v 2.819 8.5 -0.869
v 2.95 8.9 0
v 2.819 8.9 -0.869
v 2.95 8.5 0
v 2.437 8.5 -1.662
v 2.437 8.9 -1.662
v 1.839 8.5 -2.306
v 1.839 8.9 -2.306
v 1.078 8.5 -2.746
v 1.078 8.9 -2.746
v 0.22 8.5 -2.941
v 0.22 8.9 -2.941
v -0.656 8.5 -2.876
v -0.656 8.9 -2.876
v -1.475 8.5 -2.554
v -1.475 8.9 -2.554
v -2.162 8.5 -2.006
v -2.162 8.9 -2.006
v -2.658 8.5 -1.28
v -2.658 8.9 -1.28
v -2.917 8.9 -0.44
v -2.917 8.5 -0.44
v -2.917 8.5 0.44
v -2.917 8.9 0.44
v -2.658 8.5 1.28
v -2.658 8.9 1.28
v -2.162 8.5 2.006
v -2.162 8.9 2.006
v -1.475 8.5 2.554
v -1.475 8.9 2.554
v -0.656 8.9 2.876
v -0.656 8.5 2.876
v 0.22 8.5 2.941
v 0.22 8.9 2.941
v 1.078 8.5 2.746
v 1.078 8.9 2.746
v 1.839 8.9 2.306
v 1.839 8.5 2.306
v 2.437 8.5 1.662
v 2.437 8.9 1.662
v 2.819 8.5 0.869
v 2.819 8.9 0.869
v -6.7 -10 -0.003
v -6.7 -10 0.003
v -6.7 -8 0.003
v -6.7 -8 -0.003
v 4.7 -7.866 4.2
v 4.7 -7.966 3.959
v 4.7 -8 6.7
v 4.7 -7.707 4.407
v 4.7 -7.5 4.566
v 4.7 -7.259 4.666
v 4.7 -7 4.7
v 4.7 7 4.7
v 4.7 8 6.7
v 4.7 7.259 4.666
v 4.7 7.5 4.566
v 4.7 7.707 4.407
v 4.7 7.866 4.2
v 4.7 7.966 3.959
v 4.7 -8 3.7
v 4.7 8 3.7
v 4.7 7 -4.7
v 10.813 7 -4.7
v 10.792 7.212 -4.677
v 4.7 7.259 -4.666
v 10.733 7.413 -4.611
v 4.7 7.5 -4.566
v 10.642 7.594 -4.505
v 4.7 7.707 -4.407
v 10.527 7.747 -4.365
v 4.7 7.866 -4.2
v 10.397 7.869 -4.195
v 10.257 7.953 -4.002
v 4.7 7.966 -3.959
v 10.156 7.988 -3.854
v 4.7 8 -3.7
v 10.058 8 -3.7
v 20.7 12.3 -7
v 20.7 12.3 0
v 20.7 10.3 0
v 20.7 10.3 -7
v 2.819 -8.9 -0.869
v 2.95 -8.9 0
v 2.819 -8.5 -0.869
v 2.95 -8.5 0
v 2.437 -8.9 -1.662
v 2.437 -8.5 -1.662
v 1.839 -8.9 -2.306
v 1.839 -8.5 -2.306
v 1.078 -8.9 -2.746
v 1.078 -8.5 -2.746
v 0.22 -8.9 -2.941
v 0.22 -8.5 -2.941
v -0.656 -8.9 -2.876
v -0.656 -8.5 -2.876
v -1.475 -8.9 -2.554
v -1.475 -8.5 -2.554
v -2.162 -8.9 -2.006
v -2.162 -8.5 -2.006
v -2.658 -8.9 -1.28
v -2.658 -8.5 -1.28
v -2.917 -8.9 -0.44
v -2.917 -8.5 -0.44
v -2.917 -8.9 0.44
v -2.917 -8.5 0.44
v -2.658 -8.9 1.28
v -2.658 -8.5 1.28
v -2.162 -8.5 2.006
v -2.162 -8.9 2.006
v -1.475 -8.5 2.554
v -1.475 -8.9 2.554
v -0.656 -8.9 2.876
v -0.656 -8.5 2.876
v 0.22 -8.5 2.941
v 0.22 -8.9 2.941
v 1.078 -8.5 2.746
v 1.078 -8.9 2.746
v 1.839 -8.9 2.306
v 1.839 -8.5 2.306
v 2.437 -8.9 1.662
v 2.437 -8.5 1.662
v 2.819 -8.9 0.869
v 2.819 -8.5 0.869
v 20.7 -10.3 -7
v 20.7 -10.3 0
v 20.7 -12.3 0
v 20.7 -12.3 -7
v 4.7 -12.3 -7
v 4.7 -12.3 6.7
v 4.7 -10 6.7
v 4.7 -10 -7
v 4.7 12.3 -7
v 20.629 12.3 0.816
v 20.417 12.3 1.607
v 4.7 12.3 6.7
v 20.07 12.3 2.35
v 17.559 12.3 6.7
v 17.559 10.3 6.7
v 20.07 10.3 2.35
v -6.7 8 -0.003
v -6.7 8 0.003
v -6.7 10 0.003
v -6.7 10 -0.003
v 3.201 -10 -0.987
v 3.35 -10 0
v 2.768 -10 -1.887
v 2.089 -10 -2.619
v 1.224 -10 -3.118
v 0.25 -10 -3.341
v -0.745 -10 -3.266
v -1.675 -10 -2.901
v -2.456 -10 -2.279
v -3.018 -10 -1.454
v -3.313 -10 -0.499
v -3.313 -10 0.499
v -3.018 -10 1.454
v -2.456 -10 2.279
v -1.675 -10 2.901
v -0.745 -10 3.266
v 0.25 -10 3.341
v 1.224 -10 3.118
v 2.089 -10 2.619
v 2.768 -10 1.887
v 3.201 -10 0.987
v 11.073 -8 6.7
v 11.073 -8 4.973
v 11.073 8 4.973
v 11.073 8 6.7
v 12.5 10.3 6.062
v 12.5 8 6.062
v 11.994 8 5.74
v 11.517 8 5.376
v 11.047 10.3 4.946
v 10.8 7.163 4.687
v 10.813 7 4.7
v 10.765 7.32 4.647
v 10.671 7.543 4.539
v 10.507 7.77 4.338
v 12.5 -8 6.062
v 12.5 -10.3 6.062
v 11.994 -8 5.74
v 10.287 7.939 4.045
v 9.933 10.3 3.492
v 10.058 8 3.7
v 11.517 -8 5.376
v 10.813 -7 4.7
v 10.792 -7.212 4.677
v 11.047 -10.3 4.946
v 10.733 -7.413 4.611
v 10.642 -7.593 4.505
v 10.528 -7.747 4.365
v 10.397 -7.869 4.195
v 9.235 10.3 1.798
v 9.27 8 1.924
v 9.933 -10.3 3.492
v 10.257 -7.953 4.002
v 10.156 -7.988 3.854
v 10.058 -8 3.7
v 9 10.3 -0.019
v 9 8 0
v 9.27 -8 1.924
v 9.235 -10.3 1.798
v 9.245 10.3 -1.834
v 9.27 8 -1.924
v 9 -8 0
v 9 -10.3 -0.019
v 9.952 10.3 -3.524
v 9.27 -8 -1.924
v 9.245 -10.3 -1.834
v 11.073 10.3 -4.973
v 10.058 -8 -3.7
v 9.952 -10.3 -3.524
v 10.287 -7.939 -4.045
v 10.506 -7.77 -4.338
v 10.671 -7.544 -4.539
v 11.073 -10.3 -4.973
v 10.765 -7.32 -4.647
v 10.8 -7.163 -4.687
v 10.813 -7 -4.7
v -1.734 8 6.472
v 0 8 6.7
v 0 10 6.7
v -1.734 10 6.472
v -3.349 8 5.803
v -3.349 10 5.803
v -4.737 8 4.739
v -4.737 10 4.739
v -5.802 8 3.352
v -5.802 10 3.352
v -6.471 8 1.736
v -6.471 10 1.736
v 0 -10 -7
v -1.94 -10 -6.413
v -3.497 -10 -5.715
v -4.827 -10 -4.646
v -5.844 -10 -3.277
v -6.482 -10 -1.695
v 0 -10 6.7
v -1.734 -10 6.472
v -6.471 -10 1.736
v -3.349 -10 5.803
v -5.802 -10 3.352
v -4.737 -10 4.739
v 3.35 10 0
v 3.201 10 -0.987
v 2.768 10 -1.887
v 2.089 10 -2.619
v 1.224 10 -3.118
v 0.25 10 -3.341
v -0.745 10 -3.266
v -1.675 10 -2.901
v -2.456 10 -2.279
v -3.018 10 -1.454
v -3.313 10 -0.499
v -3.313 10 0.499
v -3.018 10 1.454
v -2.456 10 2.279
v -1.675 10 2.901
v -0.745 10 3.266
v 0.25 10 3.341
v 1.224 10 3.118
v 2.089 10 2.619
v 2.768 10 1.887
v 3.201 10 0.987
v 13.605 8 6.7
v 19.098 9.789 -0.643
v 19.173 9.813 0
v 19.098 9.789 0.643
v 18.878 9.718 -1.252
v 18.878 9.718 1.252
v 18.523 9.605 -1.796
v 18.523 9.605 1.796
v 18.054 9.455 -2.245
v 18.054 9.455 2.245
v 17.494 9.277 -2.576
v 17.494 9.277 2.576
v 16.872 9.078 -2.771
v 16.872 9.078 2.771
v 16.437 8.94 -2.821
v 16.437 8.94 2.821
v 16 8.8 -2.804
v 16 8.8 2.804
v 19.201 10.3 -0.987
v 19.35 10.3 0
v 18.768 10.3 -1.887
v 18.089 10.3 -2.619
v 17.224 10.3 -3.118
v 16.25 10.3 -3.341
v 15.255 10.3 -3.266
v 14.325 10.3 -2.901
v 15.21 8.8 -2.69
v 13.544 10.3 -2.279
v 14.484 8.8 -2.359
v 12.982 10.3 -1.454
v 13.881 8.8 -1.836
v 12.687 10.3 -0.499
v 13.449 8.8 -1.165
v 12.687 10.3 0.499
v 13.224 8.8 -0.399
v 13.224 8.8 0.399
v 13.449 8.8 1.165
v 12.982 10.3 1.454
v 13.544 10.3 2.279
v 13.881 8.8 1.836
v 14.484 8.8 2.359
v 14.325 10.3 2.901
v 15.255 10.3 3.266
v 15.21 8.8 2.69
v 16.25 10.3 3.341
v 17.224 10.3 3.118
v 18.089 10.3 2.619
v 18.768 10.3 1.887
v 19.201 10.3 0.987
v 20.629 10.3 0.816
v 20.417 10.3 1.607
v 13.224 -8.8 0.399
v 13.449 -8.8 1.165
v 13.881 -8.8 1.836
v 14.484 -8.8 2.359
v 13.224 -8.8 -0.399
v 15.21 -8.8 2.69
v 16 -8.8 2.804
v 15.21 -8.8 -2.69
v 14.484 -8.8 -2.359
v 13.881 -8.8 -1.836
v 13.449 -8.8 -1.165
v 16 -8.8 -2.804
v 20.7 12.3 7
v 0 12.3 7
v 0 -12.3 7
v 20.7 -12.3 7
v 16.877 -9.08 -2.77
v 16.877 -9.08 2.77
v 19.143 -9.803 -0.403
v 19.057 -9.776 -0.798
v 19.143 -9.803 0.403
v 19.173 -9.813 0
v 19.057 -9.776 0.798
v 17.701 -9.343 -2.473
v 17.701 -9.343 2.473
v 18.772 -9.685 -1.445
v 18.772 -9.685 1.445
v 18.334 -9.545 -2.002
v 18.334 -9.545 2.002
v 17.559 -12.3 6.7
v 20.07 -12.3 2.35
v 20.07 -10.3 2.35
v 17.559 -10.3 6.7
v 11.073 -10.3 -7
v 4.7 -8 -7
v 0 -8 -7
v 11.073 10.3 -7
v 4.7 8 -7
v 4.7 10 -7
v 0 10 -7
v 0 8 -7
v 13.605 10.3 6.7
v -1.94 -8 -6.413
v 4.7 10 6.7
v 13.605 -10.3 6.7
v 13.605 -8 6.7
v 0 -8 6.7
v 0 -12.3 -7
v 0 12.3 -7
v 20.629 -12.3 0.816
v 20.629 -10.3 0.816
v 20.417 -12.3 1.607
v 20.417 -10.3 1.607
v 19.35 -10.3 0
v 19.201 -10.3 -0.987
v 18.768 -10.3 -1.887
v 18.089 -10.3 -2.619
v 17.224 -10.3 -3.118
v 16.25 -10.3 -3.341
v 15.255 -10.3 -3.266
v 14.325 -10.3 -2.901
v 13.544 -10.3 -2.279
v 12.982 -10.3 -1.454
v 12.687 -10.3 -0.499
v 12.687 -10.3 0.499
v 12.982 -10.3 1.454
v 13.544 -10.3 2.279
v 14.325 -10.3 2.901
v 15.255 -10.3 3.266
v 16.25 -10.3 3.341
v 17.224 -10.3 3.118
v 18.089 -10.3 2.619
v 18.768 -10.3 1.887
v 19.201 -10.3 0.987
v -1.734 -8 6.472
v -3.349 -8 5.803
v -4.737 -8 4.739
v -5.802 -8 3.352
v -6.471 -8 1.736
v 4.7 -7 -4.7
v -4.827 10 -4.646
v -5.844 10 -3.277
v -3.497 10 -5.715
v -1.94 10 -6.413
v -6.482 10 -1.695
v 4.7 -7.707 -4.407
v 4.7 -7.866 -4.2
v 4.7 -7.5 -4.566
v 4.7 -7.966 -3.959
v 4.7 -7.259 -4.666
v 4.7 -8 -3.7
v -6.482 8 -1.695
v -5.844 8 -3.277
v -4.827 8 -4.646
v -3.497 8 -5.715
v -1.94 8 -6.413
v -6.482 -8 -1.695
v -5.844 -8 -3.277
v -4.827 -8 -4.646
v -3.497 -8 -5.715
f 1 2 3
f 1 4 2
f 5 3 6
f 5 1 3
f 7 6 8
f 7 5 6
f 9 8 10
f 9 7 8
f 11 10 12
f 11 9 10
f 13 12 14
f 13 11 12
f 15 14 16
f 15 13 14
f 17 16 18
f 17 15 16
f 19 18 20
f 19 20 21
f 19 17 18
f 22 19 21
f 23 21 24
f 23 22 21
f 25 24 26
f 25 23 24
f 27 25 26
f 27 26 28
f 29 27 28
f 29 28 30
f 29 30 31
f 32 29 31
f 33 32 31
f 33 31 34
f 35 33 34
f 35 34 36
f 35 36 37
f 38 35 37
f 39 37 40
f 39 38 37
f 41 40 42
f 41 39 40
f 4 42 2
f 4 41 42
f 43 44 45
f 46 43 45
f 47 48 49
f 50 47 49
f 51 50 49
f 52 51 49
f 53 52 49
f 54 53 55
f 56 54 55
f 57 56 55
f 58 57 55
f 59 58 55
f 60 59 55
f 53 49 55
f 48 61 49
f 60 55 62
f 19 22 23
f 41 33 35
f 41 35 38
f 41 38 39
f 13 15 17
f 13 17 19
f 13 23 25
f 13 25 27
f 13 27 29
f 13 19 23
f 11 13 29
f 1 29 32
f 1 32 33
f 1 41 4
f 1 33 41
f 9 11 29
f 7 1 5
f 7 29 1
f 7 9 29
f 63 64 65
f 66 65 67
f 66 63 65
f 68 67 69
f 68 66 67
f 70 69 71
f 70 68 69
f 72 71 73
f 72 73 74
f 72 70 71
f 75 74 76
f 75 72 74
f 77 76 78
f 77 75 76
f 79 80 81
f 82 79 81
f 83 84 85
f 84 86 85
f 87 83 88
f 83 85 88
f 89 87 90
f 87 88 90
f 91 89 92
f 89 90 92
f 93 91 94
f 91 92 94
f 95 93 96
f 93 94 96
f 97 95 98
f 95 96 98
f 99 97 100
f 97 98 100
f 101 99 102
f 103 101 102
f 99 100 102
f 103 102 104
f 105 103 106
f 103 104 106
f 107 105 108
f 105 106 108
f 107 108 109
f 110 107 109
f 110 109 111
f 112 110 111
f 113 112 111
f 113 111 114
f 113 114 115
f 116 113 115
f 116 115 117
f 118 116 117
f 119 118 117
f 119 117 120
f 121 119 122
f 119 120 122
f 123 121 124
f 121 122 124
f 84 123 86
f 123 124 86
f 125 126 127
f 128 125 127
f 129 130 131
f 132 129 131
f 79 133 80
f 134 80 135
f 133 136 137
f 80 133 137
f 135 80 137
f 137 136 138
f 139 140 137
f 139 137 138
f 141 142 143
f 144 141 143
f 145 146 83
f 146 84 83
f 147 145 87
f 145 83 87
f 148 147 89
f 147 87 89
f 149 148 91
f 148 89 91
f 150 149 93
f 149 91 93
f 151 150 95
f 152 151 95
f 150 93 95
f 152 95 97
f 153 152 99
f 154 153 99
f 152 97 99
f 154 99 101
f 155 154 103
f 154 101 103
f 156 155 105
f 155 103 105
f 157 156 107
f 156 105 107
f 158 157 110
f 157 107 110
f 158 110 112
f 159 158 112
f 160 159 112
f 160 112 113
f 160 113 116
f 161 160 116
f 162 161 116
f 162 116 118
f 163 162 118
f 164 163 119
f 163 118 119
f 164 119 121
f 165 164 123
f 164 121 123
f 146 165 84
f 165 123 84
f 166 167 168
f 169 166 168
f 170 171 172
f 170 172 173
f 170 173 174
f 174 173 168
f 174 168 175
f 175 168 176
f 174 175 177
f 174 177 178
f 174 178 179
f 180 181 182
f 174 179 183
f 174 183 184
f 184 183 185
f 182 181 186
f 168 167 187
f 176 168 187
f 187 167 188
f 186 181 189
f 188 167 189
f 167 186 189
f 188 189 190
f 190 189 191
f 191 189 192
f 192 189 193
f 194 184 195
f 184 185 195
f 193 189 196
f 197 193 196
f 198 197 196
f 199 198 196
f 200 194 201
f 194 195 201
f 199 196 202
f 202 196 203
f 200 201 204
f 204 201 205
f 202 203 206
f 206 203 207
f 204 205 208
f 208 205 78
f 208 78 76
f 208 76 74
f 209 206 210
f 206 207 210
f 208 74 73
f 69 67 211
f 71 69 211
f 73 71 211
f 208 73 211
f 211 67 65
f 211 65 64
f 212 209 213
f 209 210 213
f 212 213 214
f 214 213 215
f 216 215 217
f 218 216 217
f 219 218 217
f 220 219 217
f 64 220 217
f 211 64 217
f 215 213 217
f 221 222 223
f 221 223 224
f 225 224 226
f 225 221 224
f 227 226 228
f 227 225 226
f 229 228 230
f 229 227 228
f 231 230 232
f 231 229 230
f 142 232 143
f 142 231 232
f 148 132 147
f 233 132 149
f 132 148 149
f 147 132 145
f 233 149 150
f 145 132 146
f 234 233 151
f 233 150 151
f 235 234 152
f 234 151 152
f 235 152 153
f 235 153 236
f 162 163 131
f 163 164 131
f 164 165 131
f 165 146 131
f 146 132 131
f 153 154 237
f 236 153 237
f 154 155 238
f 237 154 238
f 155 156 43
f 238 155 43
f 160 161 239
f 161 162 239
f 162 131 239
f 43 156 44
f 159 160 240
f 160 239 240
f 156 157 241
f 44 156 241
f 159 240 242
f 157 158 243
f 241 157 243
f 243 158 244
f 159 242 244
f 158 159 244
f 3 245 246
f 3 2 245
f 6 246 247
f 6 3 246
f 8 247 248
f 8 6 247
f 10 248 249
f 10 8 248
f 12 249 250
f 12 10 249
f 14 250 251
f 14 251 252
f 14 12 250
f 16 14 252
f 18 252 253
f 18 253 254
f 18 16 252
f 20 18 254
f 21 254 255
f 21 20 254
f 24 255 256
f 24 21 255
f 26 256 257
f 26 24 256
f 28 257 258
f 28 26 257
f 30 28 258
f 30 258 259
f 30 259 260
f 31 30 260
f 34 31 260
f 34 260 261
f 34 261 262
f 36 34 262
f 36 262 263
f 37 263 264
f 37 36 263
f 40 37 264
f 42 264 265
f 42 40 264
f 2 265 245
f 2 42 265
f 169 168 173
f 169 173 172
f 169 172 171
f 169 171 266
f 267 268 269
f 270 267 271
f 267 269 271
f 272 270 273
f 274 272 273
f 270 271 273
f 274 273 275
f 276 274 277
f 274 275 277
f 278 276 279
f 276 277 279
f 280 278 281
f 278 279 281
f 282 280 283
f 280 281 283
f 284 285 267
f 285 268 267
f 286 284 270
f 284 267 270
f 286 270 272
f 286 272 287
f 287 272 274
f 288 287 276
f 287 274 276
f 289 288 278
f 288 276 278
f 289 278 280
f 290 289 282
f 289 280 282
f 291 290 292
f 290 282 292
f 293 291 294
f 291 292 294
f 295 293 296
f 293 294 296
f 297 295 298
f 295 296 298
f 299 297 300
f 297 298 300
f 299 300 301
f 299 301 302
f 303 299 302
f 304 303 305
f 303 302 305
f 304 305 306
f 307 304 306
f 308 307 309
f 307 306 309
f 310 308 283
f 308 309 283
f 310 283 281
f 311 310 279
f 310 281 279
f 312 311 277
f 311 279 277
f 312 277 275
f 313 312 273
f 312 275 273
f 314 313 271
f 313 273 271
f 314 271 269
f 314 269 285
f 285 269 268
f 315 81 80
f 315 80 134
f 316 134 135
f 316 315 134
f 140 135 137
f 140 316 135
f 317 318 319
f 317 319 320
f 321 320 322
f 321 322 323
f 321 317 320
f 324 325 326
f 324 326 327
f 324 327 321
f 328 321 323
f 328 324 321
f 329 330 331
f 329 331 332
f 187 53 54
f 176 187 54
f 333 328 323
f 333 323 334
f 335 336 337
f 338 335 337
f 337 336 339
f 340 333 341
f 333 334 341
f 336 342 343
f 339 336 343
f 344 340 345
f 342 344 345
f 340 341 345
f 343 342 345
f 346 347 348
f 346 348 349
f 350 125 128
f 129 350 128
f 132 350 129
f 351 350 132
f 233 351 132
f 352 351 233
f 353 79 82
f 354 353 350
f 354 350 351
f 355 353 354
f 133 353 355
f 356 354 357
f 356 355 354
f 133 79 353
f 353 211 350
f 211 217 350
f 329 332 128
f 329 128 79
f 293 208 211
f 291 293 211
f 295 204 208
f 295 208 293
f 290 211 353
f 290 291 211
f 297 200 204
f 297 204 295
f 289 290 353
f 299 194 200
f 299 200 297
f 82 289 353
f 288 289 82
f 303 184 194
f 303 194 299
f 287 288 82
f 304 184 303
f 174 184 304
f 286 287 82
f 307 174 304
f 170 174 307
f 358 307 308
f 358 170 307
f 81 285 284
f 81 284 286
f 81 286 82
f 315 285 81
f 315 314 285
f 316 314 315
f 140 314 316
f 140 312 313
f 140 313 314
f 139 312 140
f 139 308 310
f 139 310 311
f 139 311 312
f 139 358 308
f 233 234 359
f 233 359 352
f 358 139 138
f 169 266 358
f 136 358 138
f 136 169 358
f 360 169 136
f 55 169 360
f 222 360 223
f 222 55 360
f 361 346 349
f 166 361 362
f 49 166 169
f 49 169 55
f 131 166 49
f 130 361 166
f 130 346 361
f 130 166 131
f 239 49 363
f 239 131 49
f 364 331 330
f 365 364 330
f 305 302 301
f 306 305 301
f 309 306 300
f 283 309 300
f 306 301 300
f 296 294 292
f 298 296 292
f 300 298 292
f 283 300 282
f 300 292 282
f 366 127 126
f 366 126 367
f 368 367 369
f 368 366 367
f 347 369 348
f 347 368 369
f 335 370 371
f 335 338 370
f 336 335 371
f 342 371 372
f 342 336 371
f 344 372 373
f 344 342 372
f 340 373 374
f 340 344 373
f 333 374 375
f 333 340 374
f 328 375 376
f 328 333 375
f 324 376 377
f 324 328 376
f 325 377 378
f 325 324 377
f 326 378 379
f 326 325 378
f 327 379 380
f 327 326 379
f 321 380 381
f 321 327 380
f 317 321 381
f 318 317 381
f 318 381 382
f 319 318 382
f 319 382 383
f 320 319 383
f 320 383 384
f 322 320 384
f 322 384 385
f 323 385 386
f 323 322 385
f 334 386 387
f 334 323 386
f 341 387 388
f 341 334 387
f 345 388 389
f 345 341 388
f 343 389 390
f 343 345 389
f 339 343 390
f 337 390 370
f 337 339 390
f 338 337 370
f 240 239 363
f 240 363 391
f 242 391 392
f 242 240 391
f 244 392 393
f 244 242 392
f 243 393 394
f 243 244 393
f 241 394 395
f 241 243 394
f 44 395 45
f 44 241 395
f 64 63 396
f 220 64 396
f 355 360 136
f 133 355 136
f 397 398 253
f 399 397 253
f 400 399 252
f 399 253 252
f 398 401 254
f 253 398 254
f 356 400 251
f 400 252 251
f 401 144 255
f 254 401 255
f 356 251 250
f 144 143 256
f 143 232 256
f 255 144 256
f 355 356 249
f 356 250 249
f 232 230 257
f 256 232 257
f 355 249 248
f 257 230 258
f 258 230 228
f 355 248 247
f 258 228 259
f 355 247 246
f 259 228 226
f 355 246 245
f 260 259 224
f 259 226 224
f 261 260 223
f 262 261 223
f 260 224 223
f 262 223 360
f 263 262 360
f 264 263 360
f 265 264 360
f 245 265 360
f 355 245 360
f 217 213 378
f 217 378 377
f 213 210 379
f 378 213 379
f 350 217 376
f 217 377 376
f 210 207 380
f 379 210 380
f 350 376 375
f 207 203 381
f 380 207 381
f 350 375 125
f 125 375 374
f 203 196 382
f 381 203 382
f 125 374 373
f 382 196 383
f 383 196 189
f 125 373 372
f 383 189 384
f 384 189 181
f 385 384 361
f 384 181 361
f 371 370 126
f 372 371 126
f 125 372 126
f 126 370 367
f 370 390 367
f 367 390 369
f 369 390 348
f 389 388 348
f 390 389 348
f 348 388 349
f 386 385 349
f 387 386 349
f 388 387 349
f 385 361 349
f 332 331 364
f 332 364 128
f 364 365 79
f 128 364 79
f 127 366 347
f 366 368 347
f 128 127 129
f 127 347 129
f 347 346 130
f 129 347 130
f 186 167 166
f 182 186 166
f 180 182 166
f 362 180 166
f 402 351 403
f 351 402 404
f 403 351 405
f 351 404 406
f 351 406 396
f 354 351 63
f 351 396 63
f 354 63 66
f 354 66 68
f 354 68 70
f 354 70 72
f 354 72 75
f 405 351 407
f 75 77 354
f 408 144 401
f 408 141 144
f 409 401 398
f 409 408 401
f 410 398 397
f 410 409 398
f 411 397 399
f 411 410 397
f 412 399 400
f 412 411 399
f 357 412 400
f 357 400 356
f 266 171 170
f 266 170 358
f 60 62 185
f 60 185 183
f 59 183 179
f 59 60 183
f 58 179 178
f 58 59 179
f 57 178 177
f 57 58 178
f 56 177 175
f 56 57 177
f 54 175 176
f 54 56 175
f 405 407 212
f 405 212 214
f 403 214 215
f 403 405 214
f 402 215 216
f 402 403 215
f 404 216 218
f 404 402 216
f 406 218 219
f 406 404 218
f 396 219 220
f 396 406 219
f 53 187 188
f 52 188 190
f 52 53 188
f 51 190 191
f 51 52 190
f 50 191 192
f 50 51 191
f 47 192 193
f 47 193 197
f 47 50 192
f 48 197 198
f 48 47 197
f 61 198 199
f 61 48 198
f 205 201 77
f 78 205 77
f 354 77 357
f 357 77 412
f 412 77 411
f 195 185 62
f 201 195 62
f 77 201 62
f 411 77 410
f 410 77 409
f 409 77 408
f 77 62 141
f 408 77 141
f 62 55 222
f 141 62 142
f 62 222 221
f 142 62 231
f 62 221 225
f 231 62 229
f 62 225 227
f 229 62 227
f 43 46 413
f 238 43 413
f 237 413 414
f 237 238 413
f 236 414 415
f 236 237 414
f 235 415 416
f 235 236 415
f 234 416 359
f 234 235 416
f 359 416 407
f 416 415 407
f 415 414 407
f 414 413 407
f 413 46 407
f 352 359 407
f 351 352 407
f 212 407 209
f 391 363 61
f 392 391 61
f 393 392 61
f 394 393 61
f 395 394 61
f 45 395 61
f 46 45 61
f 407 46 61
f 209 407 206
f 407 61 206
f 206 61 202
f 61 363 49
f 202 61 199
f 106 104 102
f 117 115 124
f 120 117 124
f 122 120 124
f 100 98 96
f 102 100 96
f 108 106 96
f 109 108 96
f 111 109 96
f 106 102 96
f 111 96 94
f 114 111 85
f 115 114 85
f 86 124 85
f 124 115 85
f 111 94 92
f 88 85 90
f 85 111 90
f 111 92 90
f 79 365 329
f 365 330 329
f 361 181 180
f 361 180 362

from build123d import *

# Parameters (mm, degrees)
PAD_DEPTH            = 7
SKETCH002_W          = 29.4
SKETCH002_H          = 15.7
POCKET_DEPTH         = 13
POCKET001_DEPTH      = 10.3
POCKET002_DEPTH      = 6.701
POCKET002_DEPTH_BACK = -20.701
SKETCH005_W          = 4.926722
SKETCH005_H          = 16
POCKET003_DEPTH      = 6.701
POCKET004_DEPTH      = 7.001
POCKET004_DEPTH_BACK = -6.701
SKETCH009_W          = 20.7
SKETCH009_H          = 24.6
PAD001_DEPTH         = 7


with BuildPart() as chain_link:
    # Sketch001 → Pad (new body, symmetric)
    with BuildSketch(Plane.XY):
        Polygon((-6.7, 10), (4.7, 10), (4.7, 12.3), (20.7, 12.3), (20.7, -12.3), (4.7, -12.3), (4.7, -10), (-6.7, -10), (-6.7, -8), (4.7, -8), (4.7, 8), (-6.7, 8), align=None)
    extrude(amount=PAD_DEPTH, both=True)

    # Sketch002 → Pocket (cut, symmetric)
    with BuildSketch(Plane.XZ):
        with Locations((7, -0.15)):
            Rectangle(SKETCH002_W, SKETCH002_H)
        with BuildLine():
            ThreePointArc((0, 6.7), (-6.627826, 0.98078), (-1.940429, -6.412857))
            Line((-1.940429, -6.412857), (0, -7))
            Line((20.7, -7), (0, -7))
            Line((20.7, -7), (20.7, 0))
            ThreePointArc((20.7, 0), (20.539851, 1.21645), (20.070319, 2.35))
            Line((20.070319, 2.35), (17.558846, 6.7))
            Line((17.558846, 6.7), (0, 6.7))
        make_face(mode=Mode.SUBTRACT)
    extrude(amount=POCKET_DEPTH, both=True, mode=Mode.SUBTRACT)

    # Sketch003 → Pocket001 (cut, symmetric)
    with BuildSketch(Plane.XZ):
        with BuildLine():
            Line((11.073278, -4.972666), (11.073278, -7))
            Line((11.073278, -7), (20.7, -7))
            Line((20.7, -7), (20.7, 0))
            ThreePointArc((20.7, 0), (20.539851, 1.21645), (20.070319, 2.35))
            Line((20.070319, 2.35), (17.558846, 6.7))
            Line((13.60474, 6.7), (17.558846, 6.7))
            Line((12.500023, 6.062191), (13.60474, 6.7))
            ThreePointArc((12.500023, 6.062191), (9.057786, 0.897589), (11.073278, -4.972666))
        make_face()
    extrude(amount=POCKET001_DEPTH, both=True, mode=Mode.SUBTRACT)

    # Sketch004 → Pocket002 (cut, two sides)
    with BuildSketch(Plane.YZ) as pocket002_sk:
        with BuildLine():
            Line((-7, 4.7), (7, 4.7))
            ThreePointArc((8, 3.7), (7.707107, 4.407107), (7, 4.7))
            Line((8, 3.7), (8, -3.7))
            ThreePointArc((7, -4.7), (7.707107, -4.407107), (8, -3.7))
            Line((7, -4.7), (-7, -4.7))
            ThreePointArc((-8, -3.7), (-7.707107, -4.407107), (-7, -4.7))
            Line((-8, -3.7), (-8, 3.7))
            ThreePointArc((-7, 4.7), (-7.707107, 4.407107), (-8, 3.7))
        make_face()
    extrude(amount=-POCKET002_DEPTH, mode=Mode.SUBTRACT)
    extrude(pocket002_sk.sketch, amount=-POCKET002_DEPTH_BACK, mode=Mode.SUBTRACT)

    # Sketch005 → Pocket003 (cut, through all)
    with BuildSketch(Plane.XY):
        with Locations((13.536639, 0)):
            Rectangle(SKETCH005_W, SKETCH005_H)
    extrude(amount=POCKET003_DEPTH, mode=Mode.SUBTRACT)

    # Sketch006 → Revolution (revolve)
    with BuildSketch(Plane.XY):
        Polygon((16, 10.3), (19.35, 10.3), (18.804045, 8.8), (16, 8.8), align=None)
    revolution = revolve(axis=Axis((16, 8.8, 0), (0, 1, 0)))

    # Mirrored: Revolution across XZ
    add(revolution.mirror(Plane.XZ))

    # Sketch007 → Groove (revolve, cut)
    with BuildSketch(Plane.XY):
        Polygon((0, 10), (3.35, 10), (2.949633, 8.9), (2.949633, 8.5), (0, 8.5), align=None)
    groove = revolve(axis=Axis((0, 0, 0), (0, 1, 0)), mode=Mode.SUBTRACT)

    # Mirrored001: Groove across XZ
    add(groove.mirror(Plane.XZ), mode=Mode.SUBTRACT)

    # Sketch008 → Pocket004 (cut, two sides)
    with BuildSketch(Plane.XY) as pocket004_sk:
        Polygon((16, 8.8), (16, -8.8), (20.7, -10.3), (20.7, 10.3), align=None)
    extrude(amount=-POCKET004_DEPTH, mode=Mode.SUBTRACT)
    extrude(pocket004_sk.sketch, amount=-POCKET004_DEPTH_BACK, mode=Mode.SUBTRACT)


with BuildPart() as endpiece_rigid_plugside:
    # Sketch009 → Pad001 (new body, symmetric)
    with BuildSketch(Plane.XY):
        with Locations((10.35, 0)):
            Rectangle(SKETCH009_W, SKETCH009_H)
    extrude(amount=PAD001_DEPTH, both=True)


solid = Compound([chain_link.part, endpiece_rigid_plugside.part])
